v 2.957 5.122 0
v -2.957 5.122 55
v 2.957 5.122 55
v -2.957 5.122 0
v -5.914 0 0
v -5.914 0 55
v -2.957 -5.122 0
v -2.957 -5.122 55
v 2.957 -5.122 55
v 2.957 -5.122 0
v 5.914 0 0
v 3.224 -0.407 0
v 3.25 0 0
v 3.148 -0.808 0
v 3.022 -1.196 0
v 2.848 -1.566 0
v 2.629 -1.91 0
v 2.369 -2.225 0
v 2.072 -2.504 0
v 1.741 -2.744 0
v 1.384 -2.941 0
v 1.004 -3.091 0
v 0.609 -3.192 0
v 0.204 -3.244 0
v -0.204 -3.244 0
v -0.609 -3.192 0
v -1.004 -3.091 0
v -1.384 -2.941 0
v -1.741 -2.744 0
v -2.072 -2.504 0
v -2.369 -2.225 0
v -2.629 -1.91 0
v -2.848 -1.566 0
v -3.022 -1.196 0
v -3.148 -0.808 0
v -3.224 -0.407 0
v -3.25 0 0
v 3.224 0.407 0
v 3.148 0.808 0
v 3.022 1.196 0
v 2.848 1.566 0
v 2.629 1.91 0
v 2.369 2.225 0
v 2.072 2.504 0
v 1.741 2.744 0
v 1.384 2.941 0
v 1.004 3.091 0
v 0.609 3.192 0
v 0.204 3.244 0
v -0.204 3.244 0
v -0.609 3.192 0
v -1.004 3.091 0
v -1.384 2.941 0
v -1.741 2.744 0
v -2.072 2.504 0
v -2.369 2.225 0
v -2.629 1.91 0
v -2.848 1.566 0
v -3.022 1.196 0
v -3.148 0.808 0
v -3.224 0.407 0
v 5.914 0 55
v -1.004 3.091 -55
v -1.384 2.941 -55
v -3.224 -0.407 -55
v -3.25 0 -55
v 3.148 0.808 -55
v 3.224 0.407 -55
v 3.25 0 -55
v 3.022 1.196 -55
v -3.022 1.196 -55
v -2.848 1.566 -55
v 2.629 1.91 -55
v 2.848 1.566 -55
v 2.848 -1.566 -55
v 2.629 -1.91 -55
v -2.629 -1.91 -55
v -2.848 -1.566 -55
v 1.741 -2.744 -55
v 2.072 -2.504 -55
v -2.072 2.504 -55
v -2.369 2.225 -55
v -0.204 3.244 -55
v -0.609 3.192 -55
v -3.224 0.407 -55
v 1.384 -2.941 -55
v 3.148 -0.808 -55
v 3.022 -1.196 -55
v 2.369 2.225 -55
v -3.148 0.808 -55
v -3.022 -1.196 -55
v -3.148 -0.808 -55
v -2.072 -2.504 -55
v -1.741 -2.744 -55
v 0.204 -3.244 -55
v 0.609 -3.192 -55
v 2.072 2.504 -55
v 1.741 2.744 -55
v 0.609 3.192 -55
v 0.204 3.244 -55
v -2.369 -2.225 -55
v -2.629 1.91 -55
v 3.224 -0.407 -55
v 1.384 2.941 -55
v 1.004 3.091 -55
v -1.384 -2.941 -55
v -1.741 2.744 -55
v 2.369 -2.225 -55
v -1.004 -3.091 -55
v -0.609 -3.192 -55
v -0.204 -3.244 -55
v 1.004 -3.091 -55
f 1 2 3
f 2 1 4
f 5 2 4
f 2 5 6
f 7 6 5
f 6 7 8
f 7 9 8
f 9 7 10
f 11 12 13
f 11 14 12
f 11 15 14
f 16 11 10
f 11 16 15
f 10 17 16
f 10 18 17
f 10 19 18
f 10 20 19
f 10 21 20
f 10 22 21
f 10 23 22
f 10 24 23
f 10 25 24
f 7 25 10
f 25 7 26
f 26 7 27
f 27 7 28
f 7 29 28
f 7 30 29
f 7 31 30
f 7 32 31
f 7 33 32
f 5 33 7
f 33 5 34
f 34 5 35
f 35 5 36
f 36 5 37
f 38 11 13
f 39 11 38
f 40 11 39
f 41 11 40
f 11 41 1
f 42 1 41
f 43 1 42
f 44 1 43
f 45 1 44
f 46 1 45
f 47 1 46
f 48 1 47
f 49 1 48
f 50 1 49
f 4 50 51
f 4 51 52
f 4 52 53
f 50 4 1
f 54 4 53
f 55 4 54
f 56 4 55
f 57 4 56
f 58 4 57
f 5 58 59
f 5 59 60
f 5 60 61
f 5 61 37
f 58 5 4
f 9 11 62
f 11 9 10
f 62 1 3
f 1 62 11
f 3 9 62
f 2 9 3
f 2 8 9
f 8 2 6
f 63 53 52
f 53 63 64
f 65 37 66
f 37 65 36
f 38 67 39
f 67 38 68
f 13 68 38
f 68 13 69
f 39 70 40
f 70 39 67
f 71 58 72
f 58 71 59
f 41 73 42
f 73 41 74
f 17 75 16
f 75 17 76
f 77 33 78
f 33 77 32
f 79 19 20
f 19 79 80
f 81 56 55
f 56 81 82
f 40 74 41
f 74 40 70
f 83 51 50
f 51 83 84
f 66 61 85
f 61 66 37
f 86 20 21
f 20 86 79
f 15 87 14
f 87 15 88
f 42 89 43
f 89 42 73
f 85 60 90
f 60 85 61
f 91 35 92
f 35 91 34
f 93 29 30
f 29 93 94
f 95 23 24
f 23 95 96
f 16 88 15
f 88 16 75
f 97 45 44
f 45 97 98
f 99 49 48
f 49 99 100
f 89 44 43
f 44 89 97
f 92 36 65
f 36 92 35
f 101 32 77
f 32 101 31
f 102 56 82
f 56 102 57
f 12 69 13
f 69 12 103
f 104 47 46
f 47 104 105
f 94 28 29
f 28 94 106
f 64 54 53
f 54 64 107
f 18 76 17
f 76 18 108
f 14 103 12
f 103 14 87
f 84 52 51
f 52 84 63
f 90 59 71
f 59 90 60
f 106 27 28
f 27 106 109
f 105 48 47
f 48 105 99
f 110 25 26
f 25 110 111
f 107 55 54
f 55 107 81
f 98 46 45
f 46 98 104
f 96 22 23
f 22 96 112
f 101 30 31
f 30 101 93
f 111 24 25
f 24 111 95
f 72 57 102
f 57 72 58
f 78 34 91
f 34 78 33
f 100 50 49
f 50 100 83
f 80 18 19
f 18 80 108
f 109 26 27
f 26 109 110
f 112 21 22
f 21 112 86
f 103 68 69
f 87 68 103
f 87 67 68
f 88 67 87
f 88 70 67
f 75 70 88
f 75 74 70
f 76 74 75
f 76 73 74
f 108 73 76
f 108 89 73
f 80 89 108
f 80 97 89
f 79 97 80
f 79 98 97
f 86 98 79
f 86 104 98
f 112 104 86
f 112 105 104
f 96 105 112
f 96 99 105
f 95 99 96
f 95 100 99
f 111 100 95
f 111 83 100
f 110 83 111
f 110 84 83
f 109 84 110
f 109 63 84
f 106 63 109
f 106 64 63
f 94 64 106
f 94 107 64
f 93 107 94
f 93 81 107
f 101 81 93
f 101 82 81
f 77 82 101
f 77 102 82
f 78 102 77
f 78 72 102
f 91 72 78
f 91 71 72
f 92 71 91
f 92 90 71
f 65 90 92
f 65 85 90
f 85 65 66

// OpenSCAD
$fn = 50;


difference() {
	union() {
		linear_extrude(height = 55) {
			polygon(points = [[5.9142500000, 0.0000000000], [2.9571250000, 5.1218907443], [-2.9571250000, 5.1218907443], [-5.9142500000, 0.0000000000], [-2.9571250000, -5.1218907443], [2.9571250000, -5.1218907443]]);
		}
		translate(v = [0, 0, -55]) {
			cylinder(h = 55, r = 3.2500000000);
		}
	}
	union();
}
